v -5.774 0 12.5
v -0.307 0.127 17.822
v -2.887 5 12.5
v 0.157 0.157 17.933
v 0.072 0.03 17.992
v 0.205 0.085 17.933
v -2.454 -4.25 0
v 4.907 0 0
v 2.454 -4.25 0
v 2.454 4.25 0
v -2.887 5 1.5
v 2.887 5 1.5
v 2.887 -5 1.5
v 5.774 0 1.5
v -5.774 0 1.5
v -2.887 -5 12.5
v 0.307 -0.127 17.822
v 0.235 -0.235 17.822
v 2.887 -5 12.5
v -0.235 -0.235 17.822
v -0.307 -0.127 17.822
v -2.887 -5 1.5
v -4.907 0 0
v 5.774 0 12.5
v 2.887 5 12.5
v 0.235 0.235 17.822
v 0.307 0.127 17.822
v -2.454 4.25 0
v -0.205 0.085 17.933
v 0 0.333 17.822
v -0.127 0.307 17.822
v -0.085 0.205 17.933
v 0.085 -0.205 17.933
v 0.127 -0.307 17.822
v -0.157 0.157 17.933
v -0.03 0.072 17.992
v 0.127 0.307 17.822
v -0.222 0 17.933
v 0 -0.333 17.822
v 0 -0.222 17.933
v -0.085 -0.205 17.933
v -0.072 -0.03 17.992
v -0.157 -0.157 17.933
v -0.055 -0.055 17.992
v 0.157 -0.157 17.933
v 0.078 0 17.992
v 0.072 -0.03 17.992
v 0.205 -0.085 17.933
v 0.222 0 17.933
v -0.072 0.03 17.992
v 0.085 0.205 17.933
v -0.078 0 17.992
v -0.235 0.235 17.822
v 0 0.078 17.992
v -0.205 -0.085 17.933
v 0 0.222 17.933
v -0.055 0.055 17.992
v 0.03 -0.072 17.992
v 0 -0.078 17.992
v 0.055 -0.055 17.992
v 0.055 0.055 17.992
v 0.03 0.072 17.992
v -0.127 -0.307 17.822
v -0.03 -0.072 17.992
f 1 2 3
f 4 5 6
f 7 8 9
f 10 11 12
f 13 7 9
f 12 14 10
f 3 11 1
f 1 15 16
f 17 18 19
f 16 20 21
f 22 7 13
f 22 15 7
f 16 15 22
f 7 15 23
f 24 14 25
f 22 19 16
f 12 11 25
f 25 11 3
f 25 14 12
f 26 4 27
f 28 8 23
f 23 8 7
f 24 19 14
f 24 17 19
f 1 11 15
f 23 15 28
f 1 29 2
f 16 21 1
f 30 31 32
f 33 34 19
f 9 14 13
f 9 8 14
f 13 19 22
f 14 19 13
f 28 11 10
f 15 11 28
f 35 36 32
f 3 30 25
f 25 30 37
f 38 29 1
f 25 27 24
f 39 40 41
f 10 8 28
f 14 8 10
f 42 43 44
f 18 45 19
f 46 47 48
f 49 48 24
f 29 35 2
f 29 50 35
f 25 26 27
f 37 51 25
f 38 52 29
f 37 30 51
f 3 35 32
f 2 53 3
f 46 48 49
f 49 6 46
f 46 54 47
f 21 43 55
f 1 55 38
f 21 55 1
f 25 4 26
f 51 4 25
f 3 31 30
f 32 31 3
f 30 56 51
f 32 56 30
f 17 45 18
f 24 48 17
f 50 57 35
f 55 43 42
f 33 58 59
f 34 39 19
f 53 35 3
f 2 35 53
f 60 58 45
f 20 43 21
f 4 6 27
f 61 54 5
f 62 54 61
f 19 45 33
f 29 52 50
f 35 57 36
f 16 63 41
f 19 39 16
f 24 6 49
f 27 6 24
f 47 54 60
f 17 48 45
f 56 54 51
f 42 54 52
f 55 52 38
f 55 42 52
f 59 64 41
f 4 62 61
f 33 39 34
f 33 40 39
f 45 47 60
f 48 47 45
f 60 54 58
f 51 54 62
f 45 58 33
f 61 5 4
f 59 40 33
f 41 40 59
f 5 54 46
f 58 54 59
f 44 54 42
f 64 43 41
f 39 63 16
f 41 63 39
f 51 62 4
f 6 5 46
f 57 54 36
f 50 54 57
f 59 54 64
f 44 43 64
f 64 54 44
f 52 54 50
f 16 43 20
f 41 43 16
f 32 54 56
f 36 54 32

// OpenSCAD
// Kryształ Opieki i znacznik rundy — Strażnicy Kryształowego Drzewa (docs/FIGURKI_SPECYFIKACJA.md, rozdz. 4).
// Graniastosłup sześciokątny z ostrym czubkiem (5 ścianek szlifu) i krótkim stożkiem od spodu.
// Najlepiej drukować z przezroczystej, niebieskiej żywicy, pionowo, na podporach od spodu.
//
// Kryształ (3 szt.):      openscad -D 'rodzaj="krysztal"' -o krysztal.stl krysztal.scad
// Znacznik rundy (1 szt.): openscad -D 'rodzaj="znacznik"' -o znacznik_rundy.stl krysztal.scad

rodzaj = "krysztal";      // "krysztal" | "znacznik"

// Kryształ: 10 mm między płaskimi bokami, 18 mm wysokości.
// Znacznik: 8 mm, 14 mm, a dolna część zwęża się, żeby wchodził w gniazdo toru rund.
szerokosc = rodzaj == "znacznik" ? 8 : 10;
wysokosc = rodzaj == "znacznik" ? 14 : 18;
czubek = rodzaj == "znacznik" ? 4 : 5.5;     // wysokość ostrza
spod = rodzaj == "znacznik" ? 3 : 1.5;       // wysokość zwężenia od spodu
spod_skala = rodzaj == "znacznik" ? 0.7 : 0.85;
zaokraglenie = 0.4;       // mm, czubek nie jest ostry jak igła (figurki dla dzieci)

r = szerokosc / sqrt(3);  // promień do wierzchołka

module szesciokat(skala = 1) {
  scale([skala, skala]) circle(r = r, $fn = 6);
}

hull() {
  // Zwężony spód.
  linear_extrude(0.01) szesciokat(spod_skala);
  // Graniastosłup.
  translate([0, 0, spod]) linear_extrude(wysokosc - spod - czubek) szesciokat();
  // Ostrze: zaokrąglony czubek nad środkiem.
  translate([0, 0, wysokosc - zaokraglenie]) sphere(r = zaokraglenie, $fn = 16);
}
